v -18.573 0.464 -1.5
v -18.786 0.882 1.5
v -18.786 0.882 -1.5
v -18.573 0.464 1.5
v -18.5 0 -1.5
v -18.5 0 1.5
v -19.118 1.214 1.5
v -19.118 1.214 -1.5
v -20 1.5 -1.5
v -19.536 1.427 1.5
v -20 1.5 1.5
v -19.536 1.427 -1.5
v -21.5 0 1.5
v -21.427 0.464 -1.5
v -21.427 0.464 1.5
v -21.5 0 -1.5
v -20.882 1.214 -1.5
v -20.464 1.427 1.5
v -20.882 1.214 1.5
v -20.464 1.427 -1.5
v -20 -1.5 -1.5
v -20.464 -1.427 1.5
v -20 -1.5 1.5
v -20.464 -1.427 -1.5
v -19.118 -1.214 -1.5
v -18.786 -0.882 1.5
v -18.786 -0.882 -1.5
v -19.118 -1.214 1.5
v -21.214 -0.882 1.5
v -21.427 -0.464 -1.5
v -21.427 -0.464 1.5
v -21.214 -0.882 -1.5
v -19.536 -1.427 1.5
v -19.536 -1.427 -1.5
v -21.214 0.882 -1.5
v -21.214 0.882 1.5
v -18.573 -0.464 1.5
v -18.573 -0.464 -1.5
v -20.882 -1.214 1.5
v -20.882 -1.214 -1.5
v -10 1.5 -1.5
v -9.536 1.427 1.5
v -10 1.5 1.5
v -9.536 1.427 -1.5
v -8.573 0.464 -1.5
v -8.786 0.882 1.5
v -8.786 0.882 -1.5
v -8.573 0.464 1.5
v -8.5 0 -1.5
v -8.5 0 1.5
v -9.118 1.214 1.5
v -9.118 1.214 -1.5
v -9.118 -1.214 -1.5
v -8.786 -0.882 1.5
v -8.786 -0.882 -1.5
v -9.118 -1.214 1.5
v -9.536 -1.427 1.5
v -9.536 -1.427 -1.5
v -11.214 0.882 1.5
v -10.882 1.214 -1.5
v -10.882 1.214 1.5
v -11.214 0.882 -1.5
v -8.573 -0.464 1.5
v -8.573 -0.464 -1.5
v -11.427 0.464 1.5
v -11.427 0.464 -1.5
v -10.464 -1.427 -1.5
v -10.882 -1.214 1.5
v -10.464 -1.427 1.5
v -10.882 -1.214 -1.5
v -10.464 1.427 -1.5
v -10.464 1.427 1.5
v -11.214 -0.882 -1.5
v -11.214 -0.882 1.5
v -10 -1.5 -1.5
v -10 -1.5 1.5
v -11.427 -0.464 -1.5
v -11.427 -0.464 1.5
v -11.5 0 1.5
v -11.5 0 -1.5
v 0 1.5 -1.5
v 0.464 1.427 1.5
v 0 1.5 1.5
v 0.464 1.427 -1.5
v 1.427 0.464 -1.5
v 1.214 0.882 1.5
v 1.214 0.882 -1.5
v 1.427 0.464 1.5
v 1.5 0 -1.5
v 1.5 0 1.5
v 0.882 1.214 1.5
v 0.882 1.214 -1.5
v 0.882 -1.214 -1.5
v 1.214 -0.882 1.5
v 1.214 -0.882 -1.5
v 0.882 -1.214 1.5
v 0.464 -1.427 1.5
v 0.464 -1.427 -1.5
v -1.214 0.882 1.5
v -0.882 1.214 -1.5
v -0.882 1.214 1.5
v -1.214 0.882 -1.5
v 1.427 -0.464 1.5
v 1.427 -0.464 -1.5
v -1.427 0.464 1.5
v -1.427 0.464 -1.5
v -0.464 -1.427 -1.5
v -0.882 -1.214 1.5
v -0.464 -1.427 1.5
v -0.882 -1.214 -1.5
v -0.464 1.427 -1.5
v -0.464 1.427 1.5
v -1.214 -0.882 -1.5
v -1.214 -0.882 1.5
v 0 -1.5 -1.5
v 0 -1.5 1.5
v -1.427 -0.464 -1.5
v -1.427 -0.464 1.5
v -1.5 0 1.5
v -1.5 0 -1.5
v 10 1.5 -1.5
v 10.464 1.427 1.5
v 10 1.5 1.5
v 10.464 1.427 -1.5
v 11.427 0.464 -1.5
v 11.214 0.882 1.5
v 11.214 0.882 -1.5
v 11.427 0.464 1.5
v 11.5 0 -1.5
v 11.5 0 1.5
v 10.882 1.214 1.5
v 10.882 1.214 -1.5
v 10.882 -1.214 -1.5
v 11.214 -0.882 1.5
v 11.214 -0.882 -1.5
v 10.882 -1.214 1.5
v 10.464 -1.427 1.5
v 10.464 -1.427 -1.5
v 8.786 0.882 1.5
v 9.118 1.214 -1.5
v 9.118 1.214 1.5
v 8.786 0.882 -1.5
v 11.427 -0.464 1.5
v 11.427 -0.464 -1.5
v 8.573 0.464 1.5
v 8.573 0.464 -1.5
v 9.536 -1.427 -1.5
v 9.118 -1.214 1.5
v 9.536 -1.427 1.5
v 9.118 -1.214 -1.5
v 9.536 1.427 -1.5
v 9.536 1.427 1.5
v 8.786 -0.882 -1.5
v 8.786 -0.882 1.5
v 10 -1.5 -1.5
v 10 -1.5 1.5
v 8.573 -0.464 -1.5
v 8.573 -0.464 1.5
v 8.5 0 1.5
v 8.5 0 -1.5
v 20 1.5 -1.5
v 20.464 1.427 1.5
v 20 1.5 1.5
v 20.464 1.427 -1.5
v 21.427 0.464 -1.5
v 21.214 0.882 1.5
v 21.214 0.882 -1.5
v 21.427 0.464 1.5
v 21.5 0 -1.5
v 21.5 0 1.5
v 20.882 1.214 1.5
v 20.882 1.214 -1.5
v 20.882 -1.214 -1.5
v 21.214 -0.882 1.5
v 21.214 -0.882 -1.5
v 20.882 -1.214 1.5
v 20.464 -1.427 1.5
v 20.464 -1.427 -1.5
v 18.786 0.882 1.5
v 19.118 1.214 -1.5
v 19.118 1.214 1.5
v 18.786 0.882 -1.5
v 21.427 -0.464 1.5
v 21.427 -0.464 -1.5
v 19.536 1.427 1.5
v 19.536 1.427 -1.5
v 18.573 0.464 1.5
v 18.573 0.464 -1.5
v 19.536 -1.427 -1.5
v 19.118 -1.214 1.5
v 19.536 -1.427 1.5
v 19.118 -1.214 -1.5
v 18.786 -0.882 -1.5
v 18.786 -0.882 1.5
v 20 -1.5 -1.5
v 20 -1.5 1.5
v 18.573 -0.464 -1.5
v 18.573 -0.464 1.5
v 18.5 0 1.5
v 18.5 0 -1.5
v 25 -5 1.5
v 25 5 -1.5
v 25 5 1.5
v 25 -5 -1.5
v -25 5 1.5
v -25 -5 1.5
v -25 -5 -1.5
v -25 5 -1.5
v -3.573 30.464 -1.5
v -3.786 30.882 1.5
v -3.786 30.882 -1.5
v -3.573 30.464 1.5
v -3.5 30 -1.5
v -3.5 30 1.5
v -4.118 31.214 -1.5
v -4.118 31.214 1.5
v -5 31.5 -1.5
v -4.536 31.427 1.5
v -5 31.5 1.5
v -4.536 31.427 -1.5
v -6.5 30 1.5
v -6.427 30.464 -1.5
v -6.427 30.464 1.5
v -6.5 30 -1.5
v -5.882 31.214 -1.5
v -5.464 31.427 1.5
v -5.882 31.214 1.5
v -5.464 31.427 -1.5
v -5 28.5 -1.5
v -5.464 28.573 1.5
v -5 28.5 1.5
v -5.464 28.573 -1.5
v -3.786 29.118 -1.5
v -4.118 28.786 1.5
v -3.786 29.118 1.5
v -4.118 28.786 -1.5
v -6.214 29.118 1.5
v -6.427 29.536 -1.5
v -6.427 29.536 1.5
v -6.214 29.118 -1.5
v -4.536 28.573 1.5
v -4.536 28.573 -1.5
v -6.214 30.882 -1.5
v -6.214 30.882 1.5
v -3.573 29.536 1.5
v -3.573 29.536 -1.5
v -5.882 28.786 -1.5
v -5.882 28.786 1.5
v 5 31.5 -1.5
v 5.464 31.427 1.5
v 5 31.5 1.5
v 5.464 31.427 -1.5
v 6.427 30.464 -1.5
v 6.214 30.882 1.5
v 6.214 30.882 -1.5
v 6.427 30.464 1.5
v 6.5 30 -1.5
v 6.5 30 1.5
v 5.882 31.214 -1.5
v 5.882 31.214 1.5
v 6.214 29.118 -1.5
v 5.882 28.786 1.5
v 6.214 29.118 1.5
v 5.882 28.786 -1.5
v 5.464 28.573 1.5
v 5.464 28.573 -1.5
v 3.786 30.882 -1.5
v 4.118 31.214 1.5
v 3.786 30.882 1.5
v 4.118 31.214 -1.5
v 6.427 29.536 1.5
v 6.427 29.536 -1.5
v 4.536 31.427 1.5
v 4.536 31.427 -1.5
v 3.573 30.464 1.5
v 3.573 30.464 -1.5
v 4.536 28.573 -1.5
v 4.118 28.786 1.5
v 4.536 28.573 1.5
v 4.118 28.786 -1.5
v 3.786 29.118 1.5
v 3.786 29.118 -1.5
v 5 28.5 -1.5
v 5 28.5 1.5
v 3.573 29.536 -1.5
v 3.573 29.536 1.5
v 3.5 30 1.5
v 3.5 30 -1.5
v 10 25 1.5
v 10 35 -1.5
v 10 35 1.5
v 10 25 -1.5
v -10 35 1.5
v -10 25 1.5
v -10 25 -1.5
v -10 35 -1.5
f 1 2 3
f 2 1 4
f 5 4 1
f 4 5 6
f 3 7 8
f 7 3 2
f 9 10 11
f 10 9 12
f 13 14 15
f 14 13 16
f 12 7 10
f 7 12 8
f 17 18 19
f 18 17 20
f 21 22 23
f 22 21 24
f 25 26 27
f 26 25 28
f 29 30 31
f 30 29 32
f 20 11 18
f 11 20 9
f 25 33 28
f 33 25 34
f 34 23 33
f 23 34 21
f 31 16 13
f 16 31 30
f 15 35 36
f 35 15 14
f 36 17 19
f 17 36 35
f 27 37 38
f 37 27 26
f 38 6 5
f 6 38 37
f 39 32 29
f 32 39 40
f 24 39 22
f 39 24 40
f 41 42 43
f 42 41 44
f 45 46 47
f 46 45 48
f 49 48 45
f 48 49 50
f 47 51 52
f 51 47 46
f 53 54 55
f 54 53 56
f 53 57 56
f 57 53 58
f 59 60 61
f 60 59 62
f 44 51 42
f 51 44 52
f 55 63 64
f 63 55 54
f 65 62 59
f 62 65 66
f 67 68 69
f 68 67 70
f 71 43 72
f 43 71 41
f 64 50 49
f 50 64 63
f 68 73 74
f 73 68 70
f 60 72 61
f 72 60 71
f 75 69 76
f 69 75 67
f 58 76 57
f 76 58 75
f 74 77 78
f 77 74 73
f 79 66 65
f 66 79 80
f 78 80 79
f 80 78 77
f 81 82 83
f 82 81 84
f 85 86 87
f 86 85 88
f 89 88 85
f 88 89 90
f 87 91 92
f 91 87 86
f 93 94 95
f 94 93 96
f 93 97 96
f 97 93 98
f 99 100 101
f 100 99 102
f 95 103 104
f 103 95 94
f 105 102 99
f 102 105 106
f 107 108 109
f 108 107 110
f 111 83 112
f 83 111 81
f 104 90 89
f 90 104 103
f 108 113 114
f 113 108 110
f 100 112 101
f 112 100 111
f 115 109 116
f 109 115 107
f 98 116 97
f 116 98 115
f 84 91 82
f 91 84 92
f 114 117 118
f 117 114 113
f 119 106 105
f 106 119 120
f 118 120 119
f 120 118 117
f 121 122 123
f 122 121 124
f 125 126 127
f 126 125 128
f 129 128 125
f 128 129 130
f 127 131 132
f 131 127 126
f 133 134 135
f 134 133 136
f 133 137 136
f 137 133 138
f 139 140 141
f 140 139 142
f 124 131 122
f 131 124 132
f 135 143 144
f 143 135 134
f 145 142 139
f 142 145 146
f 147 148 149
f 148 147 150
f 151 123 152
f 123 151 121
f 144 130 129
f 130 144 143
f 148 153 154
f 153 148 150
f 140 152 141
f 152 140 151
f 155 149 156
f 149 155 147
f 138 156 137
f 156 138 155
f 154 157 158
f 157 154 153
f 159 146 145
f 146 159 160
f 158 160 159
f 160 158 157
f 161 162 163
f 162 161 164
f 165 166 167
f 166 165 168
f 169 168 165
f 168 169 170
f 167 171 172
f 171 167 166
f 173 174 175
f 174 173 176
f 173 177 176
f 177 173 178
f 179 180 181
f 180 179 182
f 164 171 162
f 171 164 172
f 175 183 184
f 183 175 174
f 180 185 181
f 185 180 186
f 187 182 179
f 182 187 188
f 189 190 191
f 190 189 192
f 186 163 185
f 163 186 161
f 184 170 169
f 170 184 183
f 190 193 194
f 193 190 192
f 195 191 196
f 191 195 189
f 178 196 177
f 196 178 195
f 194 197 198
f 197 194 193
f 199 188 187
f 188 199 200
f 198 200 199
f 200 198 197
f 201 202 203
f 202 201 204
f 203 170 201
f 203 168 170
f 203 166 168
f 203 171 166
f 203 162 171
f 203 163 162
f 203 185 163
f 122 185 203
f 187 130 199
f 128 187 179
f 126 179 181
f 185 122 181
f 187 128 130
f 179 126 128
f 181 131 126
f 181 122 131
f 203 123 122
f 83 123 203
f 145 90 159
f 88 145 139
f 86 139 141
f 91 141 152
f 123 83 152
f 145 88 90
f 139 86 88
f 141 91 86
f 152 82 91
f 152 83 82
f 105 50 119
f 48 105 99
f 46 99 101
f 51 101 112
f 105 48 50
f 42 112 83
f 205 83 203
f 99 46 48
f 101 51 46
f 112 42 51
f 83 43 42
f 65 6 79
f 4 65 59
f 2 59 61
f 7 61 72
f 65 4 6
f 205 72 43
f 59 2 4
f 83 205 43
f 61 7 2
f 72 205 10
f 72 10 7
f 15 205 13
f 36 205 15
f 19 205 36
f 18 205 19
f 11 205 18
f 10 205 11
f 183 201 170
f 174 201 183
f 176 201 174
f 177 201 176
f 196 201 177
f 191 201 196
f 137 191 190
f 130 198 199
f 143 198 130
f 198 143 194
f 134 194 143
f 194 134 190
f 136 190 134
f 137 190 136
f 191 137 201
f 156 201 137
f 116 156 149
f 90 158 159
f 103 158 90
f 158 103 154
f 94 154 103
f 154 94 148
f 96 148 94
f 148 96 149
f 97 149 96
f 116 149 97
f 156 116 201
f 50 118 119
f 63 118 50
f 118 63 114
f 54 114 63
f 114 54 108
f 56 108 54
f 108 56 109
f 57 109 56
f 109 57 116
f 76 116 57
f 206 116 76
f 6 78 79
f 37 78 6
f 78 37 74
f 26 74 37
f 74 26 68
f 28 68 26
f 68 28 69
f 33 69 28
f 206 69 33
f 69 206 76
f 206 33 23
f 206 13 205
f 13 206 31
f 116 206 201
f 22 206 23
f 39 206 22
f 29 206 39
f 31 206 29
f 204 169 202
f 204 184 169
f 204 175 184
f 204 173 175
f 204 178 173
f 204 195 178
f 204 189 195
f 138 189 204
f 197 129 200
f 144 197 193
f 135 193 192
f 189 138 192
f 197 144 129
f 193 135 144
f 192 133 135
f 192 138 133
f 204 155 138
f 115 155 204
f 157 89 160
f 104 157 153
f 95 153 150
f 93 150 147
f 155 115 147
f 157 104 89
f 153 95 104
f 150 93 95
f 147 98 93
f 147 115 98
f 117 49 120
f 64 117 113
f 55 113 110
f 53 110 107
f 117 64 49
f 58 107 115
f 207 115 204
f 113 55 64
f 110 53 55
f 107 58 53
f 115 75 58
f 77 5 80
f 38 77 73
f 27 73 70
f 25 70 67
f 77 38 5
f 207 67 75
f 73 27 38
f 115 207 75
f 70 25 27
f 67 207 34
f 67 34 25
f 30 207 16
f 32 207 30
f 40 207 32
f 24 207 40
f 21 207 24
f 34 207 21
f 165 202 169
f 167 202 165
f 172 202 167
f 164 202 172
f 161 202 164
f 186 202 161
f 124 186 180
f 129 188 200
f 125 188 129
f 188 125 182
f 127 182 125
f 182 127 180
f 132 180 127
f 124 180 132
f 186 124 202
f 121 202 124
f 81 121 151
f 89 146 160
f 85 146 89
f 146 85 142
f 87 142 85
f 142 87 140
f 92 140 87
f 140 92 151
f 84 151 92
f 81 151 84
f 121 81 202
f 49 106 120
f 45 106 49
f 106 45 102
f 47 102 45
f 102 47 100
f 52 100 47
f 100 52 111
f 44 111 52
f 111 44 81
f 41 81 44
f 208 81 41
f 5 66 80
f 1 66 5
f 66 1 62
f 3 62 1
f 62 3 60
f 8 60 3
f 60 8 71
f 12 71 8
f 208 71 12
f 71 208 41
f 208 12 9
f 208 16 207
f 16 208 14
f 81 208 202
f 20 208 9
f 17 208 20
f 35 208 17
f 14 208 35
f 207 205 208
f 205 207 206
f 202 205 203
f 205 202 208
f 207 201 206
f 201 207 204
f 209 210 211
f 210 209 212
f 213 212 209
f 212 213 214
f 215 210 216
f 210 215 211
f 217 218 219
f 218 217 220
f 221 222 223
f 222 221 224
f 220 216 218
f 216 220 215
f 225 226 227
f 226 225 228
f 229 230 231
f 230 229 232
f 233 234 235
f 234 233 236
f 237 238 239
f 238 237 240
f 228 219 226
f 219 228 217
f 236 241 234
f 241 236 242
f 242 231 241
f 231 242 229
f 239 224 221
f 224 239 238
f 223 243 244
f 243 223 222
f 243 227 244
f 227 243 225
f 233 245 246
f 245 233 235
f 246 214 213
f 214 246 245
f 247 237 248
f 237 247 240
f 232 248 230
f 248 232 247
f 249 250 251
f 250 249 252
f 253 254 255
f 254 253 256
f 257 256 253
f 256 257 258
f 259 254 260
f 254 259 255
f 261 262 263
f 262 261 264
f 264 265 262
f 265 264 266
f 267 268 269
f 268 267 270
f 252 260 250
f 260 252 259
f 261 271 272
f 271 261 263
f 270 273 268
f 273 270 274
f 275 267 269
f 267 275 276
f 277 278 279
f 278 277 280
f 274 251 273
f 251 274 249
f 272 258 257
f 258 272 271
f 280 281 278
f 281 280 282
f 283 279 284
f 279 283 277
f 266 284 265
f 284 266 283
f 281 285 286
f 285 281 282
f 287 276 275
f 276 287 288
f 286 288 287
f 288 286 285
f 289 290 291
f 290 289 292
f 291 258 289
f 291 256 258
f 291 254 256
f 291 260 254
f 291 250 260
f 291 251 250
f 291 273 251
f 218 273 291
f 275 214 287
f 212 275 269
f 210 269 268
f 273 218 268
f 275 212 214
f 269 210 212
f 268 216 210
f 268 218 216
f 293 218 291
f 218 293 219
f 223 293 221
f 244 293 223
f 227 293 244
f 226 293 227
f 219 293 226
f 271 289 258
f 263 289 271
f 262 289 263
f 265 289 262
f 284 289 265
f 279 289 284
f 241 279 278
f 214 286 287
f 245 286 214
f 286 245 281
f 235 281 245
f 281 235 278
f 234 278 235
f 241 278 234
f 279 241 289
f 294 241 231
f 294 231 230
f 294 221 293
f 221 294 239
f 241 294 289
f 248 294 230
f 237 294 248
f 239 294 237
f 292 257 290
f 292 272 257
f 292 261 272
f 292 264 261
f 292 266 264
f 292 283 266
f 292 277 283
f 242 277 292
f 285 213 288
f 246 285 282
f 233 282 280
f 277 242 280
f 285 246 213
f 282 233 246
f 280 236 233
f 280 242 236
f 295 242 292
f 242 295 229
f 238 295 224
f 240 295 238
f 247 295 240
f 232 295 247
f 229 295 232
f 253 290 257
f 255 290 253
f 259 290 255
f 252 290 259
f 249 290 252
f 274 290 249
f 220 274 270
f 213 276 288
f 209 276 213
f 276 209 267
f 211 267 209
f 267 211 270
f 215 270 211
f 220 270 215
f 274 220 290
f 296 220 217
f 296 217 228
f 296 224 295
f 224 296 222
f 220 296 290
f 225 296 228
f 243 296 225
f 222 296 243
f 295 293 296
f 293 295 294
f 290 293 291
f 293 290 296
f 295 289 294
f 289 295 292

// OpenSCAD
module pieza_mecano(drill=3,dist_taladro=10,nun_taladros=5,anchura=10,grosor=3){
    // calcular longitud de la pieza
    lx=nun_taladros*dist_taladro;

    difference(){
        //pieza
        cube([lx,anchura,grosor],center=true);
        //taladros
        translate([-lx/2+dist_taladro/2,0,0])
            for(i=[0:nun_taladros-1]){
                translate([i*dist_taladro,0,0])
                    cylinder(r=drill/2,h=grosor+5,$fn=20,center=true);
            }

    }

}

//ejemplos
pieza_mecano();
translate([0,30,0])
    pieza_mecano(nun_taladros=2);
